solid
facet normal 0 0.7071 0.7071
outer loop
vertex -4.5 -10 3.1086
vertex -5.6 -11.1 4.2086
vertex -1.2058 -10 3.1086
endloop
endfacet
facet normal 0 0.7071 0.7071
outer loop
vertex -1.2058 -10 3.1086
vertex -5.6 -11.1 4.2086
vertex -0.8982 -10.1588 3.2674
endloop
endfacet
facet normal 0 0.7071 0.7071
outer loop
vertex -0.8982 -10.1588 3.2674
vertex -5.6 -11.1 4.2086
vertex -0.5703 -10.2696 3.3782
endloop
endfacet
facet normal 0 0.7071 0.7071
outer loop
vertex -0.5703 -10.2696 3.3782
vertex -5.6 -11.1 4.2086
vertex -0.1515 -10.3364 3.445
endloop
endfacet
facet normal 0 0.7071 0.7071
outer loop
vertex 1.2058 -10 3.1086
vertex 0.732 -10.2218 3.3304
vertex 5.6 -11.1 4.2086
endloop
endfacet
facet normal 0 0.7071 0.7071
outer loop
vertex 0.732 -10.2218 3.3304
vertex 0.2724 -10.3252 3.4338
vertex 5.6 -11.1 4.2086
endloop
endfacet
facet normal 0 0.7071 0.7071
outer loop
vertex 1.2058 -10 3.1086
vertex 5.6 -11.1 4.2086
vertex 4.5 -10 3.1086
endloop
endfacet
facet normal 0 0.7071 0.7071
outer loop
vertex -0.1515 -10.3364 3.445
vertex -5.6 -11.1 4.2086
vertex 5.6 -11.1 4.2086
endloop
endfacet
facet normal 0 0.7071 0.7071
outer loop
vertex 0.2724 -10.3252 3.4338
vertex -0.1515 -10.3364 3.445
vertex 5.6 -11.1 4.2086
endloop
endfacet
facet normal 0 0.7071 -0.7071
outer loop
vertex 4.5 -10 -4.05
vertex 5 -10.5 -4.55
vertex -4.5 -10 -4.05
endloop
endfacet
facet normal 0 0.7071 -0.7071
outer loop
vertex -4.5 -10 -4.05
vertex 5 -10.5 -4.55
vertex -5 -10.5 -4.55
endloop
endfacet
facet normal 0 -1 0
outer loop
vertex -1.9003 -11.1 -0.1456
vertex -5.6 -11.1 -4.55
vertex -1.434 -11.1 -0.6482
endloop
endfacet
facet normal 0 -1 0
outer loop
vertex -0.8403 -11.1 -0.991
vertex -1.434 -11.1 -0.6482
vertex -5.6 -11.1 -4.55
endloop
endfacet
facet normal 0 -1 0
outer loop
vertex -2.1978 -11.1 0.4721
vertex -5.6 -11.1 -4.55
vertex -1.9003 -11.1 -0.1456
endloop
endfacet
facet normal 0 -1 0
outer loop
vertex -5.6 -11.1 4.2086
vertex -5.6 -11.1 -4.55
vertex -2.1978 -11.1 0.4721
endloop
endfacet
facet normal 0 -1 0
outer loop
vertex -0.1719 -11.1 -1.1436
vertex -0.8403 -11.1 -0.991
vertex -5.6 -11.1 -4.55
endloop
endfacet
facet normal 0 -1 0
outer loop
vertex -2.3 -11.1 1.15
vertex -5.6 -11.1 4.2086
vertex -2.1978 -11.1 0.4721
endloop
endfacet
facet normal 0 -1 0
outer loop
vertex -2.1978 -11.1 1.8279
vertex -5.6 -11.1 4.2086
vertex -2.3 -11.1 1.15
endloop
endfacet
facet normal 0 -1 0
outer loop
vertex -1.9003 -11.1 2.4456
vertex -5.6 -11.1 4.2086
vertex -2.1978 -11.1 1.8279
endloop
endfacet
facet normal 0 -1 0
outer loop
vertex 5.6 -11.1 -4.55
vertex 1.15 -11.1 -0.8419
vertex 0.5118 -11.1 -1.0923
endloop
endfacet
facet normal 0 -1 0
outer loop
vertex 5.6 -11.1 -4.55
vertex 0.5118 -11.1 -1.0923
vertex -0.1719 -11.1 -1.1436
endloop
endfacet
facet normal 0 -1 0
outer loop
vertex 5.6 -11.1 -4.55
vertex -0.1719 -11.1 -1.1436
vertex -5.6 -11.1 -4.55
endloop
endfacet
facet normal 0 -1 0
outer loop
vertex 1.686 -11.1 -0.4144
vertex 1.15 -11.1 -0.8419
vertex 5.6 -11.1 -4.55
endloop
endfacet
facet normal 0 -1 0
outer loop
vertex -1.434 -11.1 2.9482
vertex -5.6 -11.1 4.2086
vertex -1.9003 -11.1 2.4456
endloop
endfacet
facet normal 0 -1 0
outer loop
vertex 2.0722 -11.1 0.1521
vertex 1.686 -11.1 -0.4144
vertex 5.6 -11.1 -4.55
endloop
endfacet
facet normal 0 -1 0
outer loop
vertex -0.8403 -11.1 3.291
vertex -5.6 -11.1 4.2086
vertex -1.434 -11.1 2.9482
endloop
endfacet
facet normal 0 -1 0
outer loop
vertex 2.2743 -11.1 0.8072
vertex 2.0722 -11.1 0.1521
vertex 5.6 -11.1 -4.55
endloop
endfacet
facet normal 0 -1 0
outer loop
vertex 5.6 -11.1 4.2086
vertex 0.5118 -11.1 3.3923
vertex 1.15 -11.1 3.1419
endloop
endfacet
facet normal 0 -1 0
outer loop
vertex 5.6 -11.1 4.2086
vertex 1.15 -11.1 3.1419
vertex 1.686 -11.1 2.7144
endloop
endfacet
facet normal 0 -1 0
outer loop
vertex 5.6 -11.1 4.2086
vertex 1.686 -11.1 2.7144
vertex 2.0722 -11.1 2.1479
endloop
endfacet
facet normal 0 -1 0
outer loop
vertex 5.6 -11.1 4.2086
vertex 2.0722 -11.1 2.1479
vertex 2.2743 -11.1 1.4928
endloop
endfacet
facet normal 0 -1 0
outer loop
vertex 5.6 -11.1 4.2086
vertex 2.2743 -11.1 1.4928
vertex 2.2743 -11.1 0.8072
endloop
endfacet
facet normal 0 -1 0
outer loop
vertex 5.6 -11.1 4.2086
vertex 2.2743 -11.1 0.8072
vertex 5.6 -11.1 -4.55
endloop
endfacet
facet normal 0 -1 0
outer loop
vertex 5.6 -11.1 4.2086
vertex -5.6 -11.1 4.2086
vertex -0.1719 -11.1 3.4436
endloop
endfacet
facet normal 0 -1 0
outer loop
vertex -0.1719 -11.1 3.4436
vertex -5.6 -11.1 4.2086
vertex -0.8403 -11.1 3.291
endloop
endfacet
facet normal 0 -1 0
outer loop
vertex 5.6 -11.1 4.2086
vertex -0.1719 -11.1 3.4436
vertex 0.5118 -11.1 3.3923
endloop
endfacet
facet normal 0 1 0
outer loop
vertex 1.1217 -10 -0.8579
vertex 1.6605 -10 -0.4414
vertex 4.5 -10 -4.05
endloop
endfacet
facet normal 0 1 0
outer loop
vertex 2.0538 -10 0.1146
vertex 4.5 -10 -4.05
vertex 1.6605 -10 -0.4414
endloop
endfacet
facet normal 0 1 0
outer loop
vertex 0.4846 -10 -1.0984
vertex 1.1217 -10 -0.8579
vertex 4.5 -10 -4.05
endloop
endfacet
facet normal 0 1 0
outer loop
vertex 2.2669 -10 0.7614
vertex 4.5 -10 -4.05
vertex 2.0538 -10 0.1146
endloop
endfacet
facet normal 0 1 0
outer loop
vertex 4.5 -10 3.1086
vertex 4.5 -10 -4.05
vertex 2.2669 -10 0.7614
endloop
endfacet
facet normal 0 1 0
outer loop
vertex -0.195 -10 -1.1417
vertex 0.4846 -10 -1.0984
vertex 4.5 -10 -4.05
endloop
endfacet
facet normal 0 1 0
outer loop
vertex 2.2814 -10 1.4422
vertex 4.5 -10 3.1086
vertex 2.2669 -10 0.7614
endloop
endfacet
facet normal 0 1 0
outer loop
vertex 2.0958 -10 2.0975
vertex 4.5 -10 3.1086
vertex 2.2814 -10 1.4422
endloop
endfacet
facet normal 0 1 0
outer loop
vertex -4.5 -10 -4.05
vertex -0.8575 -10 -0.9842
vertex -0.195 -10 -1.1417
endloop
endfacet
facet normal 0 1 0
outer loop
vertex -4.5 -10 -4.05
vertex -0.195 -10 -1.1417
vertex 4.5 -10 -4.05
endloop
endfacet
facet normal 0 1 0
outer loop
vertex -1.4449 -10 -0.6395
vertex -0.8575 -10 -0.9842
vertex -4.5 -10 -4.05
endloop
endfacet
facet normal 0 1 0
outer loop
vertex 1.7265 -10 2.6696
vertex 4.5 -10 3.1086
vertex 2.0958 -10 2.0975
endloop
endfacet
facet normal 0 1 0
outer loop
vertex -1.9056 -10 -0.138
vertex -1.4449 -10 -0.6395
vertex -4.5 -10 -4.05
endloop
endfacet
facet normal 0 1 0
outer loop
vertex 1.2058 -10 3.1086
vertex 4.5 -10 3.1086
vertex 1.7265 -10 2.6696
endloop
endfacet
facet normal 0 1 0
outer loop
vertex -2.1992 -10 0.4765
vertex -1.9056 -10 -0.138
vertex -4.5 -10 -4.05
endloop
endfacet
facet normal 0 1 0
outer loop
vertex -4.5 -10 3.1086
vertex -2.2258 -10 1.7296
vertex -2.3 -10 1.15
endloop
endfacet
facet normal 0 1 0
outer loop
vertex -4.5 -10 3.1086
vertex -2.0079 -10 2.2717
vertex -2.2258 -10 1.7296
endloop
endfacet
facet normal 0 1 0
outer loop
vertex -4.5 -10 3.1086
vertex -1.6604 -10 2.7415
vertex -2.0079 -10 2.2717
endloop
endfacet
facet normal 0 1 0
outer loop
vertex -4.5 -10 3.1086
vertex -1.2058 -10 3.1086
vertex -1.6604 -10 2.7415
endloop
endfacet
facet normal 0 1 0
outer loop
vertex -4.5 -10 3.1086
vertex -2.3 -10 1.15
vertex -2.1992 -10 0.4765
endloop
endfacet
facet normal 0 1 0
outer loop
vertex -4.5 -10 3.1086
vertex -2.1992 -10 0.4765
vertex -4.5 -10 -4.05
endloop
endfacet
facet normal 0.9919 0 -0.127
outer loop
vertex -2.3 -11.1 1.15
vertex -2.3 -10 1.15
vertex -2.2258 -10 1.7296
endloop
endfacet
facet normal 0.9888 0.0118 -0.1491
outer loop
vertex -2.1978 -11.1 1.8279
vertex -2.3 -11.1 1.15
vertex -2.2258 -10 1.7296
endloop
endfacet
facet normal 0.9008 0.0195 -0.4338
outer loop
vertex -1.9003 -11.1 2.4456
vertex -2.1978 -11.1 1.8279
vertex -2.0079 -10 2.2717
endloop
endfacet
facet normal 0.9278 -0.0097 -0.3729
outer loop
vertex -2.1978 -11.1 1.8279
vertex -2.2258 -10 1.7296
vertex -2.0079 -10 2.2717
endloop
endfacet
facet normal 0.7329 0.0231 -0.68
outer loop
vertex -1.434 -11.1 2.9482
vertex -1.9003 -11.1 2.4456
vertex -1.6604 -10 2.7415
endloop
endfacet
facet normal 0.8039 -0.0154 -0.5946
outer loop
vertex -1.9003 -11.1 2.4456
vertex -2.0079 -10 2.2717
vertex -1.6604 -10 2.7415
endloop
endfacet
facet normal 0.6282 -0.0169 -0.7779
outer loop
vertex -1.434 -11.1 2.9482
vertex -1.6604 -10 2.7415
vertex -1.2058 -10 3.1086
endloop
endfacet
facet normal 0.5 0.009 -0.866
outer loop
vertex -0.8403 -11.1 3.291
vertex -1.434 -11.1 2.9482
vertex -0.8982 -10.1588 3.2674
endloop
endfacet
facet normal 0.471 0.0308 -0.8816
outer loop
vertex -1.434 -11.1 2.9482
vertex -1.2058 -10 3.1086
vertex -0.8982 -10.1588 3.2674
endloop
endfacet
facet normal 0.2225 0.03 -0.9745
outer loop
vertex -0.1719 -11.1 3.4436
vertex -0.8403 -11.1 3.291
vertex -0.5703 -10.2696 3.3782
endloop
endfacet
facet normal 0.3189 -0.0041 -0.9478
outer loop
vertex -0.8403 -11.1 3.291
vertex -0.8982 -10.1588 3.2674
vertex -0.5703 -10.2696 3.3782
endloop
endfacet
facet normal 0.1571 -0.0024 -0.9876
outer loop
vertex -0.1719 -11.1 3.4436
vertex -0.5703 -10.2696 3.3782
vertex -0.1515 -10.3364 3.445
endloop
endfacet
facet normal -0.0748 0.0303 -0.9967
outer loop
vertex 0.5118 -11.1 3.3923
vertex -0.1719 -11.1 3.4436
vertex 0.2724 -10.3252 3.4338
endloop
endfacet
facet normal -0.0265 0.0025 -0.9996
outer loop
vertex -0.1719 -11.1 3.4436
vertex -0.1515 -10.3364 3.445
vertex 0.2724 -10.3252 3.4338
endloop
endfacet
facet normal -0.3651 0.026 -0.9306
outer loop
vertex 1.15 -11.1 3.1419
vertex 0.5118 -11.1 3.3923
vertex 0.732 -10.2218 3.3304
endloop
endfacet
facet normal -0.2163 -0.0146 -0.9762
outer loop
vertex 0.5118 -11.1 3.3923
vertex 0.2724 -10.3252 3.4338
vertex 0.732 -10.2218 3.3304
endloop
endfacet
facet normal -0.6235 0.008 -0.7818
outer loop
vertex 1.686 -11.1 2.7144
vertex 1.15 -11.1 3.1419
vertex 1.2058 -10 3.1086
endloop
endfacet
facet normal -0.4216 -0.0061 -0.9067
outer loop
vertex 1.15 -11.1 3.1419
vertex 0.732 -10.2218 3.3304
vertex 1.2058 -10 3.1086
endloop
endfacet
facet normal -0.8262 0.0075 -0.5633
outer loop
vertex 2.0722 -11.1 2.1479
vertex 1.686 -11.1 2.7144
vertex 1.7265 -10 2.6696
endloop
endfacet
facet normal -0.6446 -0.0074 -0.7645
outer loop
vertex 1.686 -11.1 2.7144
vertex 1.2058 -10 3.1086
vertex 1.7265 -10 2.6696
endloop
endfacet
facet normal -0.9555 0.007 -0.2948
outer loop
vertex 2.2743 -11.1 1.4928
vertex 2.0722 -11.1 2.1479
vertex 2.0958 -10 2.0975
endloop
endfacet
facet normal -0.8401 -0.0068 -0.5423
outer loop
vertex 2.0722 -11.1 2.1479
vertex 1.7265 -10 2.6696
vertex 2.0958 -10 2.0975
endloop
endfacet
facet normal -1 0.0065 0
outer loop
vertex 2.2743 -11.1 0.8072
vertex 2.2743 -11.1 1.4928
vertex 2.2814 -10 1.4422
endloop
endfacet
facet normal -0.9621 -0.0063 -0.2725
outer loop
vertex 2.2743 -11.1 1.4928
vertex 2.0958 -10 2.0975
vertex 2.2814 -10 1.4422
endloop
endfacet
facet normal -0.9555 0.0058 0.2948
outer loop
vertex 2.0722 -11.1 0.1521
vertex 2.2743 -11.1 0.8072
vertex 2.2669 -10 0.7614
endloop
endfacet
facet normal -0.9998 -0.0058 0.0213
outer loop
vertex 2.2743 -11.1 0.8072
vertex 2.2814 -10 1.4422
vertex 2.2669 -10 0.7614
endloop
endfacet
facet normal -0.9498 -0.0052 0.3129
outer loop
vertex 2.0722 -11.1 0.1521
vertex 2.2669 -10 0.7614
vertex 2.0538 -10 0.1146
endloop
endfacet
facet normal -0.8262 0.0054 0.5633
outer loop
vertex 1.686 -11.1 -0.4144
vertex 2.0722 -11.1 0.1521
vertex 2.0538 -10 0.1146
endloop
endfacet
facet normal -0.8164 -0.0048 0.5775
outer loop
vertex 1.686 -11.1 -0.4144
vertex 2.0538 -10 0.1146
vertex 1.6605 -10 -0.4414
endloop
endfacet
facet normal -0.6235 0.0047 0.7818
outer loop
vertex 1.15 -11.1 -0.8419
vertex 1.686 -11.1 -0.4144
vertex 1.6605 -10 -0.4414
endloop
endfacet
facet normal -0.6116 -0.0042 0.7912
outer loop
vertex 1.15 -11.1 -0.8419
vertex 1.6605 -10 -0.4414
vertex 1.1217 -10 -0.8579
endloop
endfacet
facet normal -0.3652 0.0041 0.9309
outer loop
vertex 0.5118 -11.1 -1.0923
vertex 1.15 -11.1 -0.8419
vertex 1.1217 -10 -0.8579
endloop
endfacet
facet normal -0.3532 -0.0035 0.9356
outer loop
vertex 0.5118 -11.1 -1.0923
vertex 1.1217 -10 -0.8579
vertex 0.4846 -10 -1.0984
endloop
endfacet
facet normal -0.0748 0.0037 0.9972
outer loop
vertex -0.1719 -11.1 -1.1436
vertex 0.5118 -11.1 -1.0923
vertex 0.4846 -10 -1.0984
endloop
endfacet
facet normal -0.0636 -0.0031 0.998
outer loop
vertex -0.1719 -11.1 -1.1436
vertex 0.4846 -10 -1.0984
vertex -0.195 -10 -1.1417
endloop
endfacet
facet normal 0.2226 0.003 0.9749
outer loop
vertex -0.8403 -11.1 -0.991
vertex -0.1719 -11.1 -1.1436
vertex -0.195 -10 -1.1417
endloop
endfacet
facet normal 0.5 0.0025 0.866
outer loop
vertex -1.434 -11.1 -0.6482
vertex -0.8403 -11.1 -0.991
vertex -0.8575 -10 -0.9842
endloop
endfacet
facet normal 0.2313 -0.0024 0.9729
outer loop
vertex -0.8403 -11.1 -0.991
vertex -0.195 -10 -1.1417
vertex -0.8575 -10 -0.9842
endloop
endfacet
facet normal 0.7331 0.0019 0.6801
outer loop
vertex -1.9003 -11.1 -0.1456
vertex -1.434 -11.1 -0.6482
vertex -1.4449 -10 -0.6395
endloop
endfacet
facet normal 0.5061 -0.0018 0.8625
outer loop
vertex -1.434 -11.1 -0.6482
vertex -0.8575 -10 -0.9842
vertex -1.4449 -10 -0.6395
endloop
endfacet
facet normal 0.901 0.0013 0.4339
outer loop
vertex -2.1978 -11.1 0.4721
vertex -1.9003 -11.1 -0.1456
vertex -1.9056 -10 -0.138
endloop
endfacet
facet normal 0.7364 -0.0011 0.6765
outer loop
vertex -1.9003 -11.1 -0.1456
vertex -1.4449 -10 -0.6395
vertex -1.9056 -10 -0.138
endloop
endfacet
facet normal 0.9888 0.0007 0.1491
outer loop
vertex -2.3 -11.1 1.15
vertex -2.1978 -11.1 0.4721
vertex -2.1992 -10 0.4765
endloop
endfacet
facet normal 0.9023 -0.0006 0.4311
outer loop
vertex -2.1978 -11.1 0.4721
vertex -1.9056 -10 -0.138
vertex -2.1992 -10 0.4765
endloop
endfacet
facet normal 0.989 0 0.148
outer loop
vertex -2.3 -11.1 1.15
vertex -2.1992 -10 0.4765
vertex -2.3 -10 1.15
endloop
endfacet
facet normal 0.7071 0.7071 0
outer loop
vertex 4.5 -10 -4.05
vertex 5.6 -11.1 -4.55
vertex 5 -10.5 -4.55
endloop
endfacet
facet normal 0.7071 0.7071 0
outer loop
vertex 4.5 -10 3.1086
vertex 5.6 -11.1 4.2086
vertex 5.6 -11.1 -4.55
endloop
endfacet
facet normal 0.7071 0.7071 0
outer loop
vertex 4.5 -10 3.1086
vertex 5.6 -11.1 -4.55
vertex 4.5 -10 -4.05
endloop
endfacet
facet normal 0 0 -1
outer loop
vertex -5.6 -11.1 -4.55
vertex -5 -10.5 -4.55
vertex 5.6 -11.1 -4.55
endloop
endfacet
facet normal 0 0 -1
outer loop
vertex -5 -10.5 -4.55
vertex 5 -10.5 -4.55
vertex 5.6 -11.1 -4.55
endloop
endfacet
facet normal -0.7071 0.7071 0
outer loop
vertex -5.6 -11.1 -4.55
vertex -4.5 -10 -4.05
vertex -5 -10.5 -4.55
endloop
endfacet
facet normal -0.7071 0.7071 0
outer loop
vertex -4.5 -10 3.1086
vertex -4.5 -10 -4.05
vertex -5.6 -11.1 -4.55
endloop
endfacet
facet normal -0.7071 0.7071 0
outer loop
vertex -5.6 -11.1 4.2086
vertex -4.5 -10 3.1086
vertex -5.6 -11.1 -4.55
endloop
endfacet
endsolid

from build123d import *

# Parameters (mm, degrees)
PAD013_DEPTH         = 9.4
POCKET039_DEPTH      = 100
POCKET039_DEPTH_BACK = 100
SKETCH049_R          = 2.3
POCKET040_DEPTH      = 1.101
CHAMFER010_SIZE      = 0.5


with BuildPart() as part:
    # Sketch047 (on Face1 of ShapeBinder008) → Pad013 (new body)
    with BuildSketch(Plane.XY.offset(4.85)):
        Polygon((-4.5, -10), (-5.6, -11.1), (5.6, -11.1), (4.5, -10), align=None)
    extrude(amount=-PAD013_DEPTH)

    # Sketch048 (on DatumPlane) → Pocket039 (cut, two sides)
    with BuildSketch(Plane(origin=(-4.866667, -10.366667, 1.716667), x_dir=(0, -1, 0), z_dir=(-1, 0, 0))) as pocket039_sk:
        Polygon((0.833333, 2.591912), (-0.366667, 1.391912), (-1.166667, 1.391912), (-1.166667, 3.391912), (0.833333, 3.391912), align=None)
    extrude(amount=-POCKET039_DEPTH, mode=Mode.SUBTRACT)
    extrude(pocket039_sk.sketch, amount=POCKET039_DEPTH_BACK, mode=Mode.SUBTRACT)

    # Sketch049 (on Face5 of Pocket039) → Pocket040 (cut, through all)
    with BuildSketch(Plane(origin=(0, -10, 0), x_dir=(-1, 0, 0), z_dir=(0, 1, 0))):
        with Locations((0, 1.15)):
            Circle(SKETCH049_R)
    extrude(amount=-POCKET040_DEPTH, mode=Mode.SUBTRACT)

    # Chamfer010
    chamfer010_edges = [part.edges().sort_by_distance(p)[0] for p in [
        (0, -10, -4.55),
    ]]
    chamfer(chamfer010_edges, length=CHAMFER010_SIZE)


solid = part.part
